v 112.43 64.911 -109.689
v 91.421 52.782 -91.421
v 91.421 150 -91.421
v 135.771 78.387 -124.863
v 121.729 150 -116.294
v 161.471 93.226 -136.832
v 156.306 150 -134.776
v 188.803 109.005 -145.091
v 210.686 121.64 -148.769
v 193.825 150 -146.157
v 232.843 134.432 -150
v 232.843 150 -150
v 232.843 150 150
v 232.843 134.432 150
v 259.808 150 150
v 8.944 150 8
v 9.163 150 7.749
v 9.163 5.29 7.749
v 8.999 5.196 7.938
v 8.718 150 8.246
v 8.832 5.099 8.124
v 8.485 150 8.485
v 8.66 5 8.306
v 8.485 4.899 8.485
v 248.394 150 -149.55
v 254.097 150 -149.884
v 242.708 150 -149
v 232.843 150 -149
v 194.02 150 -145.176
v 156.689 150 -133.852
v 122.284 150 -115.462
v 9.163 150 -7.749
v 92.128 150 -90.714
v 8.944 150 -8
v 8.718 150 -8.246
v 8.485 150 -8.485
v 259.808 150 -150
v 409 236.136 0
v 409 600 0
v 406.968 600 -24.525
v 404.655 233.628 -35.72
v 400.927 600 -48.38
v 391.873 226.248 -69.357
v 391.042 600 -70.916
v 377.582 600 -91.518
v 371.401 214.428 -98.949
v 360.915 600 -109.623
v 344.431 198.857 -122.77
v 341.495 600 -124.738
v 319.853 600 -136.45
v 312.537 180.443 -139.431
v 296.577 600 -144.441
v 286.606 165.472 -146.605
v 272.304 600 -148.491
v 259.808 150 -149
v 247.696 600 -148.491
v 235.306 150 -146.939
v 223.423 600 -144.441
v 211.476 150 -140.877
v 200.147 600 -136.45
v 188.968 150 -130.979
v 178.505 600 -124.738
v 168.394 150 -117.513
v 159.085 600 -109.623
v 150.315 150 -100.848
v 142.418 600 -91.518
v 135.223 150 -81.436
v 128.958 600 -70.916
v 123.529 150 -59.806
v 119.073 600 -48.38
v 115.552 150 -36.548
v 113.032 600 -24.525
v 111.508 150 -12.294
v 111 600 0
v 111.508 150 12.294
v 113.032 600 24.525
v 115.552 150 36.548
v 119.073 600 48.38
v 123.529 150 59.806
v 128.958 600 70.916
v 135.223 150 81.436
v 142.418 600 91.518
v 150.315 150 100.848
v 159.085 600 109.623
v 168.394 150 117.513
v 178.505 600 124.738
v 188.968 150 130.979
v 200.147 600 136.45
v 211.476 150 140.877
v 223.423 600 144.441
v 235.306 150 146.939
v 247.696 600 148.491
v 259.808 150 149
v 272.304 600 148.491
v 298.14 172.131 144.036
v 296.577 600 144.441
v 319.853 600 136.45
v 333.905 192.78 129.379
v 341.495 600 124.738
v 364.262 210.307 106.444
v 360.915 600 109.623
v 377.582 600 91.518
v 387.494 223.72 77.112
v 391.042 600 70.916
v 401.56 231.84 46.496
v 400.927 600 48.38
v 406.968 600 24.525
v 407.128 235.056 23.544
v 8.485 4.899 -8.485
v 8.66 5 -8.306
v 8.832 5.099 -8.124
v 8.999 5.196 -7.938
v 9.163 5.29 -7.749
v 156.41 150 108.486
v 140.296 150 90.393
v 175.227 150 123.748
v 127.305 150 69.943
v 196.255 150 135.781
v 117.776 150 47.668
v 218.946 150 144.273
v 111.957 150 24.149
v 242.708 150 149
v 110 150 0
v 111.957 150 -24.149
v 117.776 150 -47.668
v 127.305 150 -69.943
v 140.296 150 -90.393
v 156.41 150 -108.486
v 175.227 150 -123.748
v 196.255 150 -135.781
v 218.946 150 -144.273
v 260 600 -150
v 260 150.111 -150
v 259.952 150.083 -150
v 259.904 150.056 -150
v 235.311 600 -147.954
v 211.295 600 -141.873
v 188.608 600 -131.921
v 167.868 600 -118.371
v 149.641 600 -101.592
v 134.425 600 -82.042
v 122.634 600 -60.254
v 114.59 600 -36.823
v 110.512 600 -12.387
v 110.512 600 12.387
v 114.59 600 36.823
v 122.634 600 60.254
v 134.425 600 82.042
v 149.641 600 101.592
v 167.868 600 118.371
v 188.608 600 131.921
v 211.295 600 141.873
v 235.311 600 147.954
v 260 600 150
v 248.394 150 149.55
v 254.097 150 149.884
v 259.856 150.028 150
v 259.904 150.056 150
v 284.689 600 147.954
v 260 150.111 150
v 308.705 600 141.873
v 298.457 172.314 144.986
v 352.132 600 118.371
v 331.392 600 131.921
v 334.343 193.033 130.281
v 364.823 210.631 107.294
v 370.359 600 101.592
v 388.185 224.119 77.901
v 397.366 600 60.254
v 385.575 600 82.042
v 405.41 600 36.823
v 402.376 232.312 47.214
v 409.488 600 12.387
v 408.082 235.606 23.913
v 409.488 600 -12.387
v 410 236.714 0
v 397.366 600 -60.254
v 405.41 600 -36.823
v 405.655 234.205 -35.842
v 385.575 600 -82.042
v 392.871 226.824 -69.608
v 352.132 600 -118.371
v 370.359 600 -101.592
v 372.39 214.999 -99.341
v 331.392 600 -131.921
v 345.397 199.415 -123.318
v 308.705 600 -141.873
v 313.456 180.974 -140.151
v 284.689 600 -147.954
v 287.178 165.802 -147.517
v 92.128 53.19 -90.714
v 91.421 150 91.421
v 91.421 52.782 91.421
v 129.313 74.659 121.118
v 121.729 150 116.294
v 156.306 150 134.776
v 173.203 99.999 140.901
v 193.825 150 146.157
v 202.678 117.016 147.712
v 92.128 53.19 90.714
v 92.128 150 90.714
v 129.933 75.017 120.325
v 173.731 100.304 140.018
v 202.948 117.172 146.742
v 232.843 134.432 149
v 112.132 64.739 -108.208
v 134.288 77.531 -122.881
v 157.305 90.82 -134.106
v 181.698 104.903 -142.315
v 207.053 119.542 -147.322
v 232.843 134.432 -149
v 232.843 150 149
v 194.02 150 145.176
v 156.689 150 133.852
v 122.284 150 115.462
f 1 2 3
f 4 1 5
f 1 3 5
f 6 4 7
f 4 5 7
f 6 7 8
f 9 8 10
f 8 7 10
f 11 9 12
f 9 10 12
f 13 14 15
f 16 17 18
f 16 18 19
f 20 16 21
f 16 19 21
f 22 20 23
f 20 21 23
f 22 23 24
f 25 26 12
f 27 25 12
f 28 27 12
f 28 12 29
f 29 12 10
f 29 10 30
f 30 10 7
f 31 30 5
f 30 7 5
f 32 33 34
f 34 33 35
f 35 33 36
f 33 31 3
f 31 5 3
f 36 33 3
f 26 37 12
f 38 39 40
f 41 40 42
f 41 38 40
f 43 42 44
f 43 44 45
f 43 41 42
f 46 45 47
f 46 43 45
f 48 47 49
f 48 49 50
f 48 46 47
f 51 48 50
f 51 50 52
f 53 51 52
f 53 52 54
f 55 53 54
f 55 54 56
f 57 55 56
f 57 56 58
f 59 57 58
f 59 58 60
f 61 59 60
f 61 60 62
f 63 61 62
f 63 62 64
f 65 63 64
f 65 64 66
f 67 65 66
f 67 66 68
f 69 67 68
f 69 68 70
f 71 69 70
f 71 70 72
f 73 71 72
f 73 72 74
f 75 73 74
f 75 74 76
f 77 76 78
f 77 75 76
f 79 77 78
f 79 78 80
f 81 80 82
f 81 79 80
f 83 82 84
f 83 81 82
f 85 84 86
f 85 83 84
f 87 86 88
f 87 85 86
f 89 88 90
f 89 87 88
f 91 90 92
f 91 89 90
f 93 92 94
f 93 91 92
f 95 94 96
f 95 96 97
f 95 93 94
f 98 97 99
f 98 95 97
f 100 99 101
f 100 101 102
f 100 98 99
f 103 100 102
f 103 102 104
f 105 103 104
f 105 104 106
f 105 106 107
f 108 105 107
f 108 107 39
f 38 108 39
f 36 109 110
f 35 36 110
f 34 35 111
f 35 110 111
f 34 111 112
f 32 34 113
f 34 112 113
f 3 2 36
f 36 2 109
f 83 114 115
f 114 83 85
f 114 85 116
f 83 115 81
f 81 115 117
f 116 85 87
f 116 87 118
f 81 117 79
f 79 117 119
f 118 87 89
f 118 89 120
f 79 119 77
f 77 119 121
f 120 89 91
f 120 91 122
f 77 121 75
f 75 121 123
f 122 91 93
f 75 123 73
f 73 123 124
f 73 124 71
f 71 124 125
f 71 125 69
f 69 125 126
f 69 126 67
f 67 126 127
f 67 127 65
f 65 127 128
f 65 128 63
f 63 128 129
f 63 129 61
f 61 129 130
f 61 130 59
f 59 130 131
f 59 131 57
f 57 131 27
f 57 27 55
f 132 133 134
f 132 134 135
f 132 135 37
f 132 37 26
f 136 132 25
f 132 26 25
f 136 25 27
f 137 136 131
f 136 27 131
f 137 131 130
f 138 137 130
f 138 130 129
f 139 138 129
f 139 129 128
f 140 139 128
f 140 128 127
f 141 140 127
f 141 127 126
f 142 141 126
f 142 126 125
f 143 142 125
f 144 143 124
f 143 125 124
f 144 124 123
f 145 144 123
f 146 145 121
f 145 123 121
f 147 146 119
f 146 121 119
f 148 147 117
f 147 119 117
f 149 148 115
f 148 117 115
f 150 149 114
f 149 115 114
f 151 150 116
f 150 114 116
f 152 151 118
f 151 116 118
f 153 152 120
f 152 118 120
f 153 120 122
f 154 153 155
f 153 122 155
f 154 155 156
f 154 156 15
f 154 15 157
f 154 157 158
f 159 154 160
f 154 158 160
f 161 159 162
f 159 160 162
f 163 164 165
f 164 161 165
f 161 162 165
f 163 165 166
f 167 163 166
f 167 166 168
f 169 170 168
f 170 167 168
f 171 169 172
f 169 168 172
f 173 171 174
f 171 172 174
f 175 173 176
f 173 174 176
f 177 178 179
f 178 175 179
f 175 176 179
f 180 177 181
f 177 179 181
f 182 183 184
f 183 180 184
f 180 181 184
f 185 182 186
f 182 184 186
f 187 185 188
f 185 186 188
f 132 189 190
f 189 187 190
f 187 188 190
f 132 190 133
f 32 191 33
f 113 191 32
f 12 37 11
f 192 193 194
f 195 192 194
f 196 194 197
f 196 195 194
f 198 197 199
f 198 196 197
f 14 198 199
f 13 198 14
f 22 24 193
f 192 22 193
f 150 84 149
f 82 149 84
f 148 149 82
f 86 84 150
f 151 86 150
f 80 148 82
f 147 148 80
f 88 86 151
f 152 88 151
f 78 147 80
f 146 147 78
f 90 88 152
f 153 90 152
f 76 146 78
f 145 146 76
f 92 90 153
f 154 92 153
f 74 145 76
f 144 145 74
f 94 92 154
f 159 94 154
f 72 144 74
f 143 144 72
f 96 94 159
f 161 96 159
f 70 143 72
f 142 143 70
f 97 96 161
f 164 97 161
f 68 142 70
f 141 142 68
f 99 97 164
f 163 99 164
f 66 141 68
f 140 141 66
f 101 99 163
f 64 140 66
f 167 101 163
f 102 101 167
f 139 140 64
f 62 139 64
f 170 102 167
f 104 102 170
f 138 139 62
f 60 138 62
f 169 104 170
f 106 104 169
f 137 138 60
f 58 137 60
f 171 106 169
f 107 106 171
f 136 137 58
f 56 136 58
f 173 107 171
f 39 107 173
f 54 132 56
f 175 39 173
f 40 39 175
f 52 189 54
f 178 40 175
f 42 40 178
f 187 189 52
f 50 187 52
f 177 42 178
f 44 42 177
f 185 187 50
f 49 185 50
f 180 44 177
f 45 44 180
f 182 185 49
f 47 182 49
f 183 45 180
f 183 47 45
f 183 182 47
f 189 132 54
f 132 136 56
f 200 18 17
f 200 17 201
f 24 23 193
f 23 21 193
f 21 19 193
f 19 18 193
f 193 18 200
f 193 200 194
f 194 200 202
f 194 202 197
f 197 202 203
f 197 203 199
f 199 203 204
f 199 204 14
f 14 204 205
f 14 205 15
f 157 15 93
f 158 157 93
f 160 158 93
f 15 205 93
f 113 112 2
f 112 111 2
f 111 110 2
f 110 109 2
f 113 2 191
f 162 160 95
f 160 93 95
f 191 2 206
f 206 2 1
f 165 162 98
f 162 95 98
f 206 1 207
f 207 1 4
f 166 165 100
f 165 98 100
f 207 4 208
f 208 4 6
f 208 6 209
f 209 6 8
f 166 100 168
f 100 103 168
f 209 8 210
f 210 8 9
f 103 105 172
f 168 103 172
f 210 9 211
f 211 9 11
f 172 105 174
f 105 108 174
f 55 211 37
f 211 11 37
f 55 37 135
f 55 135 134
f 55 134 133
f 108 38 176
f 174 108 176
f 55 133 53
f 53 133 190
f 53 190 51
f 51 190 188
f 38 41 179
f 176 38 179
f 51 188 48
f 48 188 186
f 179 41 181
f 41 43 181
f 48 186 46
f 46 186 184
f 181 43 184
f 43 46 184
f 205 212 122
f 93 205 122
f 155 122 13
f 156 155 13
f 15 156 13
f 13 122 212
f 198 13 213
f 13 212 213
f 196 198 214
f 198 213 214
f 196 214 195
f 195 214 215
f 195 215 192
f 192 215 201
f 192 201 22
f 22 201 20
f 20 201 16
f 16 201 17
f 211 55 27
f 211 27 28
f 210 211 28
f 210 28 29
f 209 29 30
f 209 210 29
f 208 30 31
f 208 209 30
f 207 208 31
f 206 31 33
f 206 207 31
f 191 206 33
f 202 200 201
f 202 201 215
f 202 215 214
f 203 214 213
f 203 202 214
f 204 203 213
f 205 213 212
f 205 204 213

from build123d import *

# Parameters (mm, degrees)
BOSS_EXTRUDE1_DEPTH     = 600
CUT_EXTRUDE1_DEPTH      = 743.024258364
CUT_EXTRUDE1_DEPTH_BACK = 743.024258364
CUT_EXTRUDE2_START      = -450
CUT_EXTRUDE2_DEPTH      = 450
FILLET1_R               = 200
SHELL2_START            = 53.190392924
SHELL2_OUTLINE_R        = 149
SHELL2_DEPTH            = 546.809607076
SHELL2_START_2          = 5.290187796
SHELL2_2_DEPTH          = 144.709812204


# Read off the part's stored shape, not the designer's step: Shell2
with BuildPart() as part:
    # Sketch1 → Boss-Extrude1 (new body)
    with BuildSketch(Plane(origin=(0, 0, 0), x_dir=(1, 0, 0), z_dir=(0, 1, 0))):
        with BuildLine():
            Line((8.485281374, -8.485281374), (150, -150))
            Line((150, -150), (260, -150))
            ThreePointArc((260, -150), (410, 0), (260, 150))
            Line((260, 150), (150, 150))
            Line((150, 150), (8.485281374, 8.485281374))
            ThreePointArc((8.485281374, 8.485281374), (12, 0), (8.485281374, -8.485281374))
        make_face()
    extrude(amount=BOSS_EXTRUDE1_DEPTH)

    # Sketch2 → Cut-Extrude1 (cut, two sides: drawn at the far end of the back side and taken through both)
    with BuildSketch(Plane.XY.offset(-CUT_EXTRUDE1_DEPTH_BACK)):
        Polygon((0, 0), (410, 236.713610368), (410, 0), align=None)
    extrude(amount=CUT_EXTRUDE1_DEPTH + CUT_EXTRUDE1_DEPTH_BACK, mode=Mode.SUBTRACT)

    # Sketch3 → Cut-Extrude2 (cut)
    with BuildSketch(Plane(origin=(0, 600, 0), x_dir=(1, 0, 0), z_dir=(0, 1, 0)).offset(CUT_EXTRUDE2_START)):
        with BuildLine():
            Line((0, 0), (150, 150))
            Line((150, 150), (260, 150))
            ThreePointArc((260, 150), (110, 0), (260, -150))
            Line((260, -150), (150, -150))
            Line((150, -150), (0, 0))
        make_face()
    extrude(amount=CUT_EXTRUDE2_DEPTH, mode=Mode.SUBTRACT)

    # Fillet1
    fillet1_edges = [part.edges().sort_by_distance(p)[0] for p in [
        (150, 118.301270189, 150),
        (150, 118.301270189, -150),
    ]]
    fillet(fillet1_edges, radius=FILLET1_R)

    # Shell2 outline → Shell2 (cut)
    with BuildSketch(Plane(origin=(0, 0, 0), x_dir=(1, 0, 0), z_dir=(0, 1, 0)).offset(SHELL2_START)):
        with Locations((260, 0)):
            Circle(SHELL2_OUTLINE_R)
    extrude(amount=SHELL2_DEPTH, mode=Mode.SUBTRACT)

    # Shell2 2 outline → Shell2 2 (cut)
    with BuildSketch(Plane(origin=(0, 0, 0), x_dir=(1, 0, 0), z_dir=(0, 1, 0)).offset(SHELL2_START_2)):
        with BuildLine():
            Line((9.162874044, -7.748660481), (92.128463018, -90.714249456))
            ThreePointArc((92.128463018, -90.714249456), (156.688709434, -133.85202697), (232.842712475, -149))
            Line((232.842712475, -149), (260, -149))
            ThreePointArc((260, -149), (111, 0), (260, 149))
            Line((260, 149), (232.842712475, 149))
            ThreePointArc((232.842712475, 149), (156.688709434, 133.85202697), (92.128463018, 90.714249456))
            Line((92.128463018, 90.714249456), (9.162874044, 7.748660481))
            ThreePointArc((9.162874044, 7.748660481), (12, 0), (9.162874044, -7.748660481))
        make_face()
    extrude(amount=SHELL2_2_DEPTH, mode=Mode.SUBTRACT)


solid = part.part
